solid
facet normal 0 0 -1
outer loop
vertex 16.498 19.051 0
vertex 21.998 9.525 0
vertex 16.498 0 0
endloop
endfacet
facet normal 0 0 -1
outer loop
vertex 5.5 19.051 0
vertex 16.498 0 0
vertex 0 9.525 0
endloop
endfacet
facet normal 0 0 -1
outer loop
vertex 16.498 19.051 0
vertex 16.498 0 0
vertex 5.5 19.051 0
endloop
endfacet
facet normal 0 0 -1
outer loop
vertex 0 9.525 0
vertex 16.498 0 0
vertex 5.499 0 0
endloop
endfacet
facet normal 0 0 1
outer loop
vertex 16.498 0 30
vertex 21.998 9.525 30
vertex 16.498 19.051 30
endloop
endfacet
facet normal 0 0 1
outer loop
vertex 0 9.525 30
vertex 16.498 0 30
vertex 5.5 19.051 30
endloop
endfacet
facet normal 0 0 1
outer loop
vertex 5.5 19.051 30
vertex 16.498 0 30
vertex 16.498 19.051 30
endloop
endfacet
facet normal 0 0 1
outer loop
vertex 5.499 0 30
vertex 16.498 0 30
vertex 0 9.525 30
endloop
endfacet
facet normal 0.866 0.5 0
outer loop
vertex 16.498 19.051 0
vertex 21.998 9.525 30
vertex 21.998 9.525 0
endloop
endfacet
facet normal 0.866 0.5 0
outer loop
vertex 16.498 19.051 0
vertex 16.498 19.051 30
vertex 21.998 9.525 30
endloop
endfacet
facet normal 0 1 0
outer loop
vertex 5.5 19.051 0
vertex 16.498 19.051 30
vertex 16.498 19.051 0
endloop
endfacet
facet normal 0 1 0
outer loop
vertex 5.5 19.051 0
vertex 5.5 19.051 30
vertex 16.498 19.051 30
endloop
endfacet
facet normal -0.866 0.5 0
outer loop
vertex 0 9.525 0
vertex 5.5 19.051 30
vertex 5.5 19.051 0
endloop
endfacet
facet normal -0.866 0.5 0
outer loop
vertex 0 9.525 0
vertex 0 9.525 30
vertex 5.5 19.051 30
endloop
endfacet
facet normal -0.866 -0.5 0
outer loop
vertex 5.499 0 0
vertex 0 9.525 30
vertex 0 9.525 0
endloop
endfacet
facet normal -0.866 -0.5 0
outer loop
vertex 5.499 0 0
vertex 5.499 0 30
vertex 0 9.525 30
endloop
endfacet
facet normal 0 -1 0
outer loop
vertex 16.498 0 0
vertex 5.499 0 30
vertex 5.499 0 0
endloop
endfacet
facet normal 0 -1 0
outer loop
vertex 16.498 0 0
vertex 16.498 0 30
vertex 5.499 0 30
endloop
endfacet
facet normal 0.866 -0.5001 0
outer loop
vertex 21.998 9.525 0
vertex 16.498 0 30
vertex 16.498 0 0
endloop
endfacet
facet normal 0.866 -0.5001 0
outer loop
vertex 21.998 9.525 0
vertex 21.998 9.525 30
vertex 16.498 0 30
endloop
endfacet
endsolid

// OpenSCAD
$fn = 32;

// ----------------------------------------------------------------------
// Key bar: hex key, 30 mm thick
// ----------------------------------------------------------------------

// --- parameters (mm) ---
profile_height = 30;      // extrusion height
profile_points = 6;       // points of the closed outline

profile = [[21.998, 9.525], [16.498, 19.051], [5.5, 19.051], [0, 9.525], [5.499, 0], [16.498, 0]];  // single closed polygon, 6 points, counter clockwise

// --- the one profile operation ---
linear_extrude(height = profile_height) polygon(points = profile);
